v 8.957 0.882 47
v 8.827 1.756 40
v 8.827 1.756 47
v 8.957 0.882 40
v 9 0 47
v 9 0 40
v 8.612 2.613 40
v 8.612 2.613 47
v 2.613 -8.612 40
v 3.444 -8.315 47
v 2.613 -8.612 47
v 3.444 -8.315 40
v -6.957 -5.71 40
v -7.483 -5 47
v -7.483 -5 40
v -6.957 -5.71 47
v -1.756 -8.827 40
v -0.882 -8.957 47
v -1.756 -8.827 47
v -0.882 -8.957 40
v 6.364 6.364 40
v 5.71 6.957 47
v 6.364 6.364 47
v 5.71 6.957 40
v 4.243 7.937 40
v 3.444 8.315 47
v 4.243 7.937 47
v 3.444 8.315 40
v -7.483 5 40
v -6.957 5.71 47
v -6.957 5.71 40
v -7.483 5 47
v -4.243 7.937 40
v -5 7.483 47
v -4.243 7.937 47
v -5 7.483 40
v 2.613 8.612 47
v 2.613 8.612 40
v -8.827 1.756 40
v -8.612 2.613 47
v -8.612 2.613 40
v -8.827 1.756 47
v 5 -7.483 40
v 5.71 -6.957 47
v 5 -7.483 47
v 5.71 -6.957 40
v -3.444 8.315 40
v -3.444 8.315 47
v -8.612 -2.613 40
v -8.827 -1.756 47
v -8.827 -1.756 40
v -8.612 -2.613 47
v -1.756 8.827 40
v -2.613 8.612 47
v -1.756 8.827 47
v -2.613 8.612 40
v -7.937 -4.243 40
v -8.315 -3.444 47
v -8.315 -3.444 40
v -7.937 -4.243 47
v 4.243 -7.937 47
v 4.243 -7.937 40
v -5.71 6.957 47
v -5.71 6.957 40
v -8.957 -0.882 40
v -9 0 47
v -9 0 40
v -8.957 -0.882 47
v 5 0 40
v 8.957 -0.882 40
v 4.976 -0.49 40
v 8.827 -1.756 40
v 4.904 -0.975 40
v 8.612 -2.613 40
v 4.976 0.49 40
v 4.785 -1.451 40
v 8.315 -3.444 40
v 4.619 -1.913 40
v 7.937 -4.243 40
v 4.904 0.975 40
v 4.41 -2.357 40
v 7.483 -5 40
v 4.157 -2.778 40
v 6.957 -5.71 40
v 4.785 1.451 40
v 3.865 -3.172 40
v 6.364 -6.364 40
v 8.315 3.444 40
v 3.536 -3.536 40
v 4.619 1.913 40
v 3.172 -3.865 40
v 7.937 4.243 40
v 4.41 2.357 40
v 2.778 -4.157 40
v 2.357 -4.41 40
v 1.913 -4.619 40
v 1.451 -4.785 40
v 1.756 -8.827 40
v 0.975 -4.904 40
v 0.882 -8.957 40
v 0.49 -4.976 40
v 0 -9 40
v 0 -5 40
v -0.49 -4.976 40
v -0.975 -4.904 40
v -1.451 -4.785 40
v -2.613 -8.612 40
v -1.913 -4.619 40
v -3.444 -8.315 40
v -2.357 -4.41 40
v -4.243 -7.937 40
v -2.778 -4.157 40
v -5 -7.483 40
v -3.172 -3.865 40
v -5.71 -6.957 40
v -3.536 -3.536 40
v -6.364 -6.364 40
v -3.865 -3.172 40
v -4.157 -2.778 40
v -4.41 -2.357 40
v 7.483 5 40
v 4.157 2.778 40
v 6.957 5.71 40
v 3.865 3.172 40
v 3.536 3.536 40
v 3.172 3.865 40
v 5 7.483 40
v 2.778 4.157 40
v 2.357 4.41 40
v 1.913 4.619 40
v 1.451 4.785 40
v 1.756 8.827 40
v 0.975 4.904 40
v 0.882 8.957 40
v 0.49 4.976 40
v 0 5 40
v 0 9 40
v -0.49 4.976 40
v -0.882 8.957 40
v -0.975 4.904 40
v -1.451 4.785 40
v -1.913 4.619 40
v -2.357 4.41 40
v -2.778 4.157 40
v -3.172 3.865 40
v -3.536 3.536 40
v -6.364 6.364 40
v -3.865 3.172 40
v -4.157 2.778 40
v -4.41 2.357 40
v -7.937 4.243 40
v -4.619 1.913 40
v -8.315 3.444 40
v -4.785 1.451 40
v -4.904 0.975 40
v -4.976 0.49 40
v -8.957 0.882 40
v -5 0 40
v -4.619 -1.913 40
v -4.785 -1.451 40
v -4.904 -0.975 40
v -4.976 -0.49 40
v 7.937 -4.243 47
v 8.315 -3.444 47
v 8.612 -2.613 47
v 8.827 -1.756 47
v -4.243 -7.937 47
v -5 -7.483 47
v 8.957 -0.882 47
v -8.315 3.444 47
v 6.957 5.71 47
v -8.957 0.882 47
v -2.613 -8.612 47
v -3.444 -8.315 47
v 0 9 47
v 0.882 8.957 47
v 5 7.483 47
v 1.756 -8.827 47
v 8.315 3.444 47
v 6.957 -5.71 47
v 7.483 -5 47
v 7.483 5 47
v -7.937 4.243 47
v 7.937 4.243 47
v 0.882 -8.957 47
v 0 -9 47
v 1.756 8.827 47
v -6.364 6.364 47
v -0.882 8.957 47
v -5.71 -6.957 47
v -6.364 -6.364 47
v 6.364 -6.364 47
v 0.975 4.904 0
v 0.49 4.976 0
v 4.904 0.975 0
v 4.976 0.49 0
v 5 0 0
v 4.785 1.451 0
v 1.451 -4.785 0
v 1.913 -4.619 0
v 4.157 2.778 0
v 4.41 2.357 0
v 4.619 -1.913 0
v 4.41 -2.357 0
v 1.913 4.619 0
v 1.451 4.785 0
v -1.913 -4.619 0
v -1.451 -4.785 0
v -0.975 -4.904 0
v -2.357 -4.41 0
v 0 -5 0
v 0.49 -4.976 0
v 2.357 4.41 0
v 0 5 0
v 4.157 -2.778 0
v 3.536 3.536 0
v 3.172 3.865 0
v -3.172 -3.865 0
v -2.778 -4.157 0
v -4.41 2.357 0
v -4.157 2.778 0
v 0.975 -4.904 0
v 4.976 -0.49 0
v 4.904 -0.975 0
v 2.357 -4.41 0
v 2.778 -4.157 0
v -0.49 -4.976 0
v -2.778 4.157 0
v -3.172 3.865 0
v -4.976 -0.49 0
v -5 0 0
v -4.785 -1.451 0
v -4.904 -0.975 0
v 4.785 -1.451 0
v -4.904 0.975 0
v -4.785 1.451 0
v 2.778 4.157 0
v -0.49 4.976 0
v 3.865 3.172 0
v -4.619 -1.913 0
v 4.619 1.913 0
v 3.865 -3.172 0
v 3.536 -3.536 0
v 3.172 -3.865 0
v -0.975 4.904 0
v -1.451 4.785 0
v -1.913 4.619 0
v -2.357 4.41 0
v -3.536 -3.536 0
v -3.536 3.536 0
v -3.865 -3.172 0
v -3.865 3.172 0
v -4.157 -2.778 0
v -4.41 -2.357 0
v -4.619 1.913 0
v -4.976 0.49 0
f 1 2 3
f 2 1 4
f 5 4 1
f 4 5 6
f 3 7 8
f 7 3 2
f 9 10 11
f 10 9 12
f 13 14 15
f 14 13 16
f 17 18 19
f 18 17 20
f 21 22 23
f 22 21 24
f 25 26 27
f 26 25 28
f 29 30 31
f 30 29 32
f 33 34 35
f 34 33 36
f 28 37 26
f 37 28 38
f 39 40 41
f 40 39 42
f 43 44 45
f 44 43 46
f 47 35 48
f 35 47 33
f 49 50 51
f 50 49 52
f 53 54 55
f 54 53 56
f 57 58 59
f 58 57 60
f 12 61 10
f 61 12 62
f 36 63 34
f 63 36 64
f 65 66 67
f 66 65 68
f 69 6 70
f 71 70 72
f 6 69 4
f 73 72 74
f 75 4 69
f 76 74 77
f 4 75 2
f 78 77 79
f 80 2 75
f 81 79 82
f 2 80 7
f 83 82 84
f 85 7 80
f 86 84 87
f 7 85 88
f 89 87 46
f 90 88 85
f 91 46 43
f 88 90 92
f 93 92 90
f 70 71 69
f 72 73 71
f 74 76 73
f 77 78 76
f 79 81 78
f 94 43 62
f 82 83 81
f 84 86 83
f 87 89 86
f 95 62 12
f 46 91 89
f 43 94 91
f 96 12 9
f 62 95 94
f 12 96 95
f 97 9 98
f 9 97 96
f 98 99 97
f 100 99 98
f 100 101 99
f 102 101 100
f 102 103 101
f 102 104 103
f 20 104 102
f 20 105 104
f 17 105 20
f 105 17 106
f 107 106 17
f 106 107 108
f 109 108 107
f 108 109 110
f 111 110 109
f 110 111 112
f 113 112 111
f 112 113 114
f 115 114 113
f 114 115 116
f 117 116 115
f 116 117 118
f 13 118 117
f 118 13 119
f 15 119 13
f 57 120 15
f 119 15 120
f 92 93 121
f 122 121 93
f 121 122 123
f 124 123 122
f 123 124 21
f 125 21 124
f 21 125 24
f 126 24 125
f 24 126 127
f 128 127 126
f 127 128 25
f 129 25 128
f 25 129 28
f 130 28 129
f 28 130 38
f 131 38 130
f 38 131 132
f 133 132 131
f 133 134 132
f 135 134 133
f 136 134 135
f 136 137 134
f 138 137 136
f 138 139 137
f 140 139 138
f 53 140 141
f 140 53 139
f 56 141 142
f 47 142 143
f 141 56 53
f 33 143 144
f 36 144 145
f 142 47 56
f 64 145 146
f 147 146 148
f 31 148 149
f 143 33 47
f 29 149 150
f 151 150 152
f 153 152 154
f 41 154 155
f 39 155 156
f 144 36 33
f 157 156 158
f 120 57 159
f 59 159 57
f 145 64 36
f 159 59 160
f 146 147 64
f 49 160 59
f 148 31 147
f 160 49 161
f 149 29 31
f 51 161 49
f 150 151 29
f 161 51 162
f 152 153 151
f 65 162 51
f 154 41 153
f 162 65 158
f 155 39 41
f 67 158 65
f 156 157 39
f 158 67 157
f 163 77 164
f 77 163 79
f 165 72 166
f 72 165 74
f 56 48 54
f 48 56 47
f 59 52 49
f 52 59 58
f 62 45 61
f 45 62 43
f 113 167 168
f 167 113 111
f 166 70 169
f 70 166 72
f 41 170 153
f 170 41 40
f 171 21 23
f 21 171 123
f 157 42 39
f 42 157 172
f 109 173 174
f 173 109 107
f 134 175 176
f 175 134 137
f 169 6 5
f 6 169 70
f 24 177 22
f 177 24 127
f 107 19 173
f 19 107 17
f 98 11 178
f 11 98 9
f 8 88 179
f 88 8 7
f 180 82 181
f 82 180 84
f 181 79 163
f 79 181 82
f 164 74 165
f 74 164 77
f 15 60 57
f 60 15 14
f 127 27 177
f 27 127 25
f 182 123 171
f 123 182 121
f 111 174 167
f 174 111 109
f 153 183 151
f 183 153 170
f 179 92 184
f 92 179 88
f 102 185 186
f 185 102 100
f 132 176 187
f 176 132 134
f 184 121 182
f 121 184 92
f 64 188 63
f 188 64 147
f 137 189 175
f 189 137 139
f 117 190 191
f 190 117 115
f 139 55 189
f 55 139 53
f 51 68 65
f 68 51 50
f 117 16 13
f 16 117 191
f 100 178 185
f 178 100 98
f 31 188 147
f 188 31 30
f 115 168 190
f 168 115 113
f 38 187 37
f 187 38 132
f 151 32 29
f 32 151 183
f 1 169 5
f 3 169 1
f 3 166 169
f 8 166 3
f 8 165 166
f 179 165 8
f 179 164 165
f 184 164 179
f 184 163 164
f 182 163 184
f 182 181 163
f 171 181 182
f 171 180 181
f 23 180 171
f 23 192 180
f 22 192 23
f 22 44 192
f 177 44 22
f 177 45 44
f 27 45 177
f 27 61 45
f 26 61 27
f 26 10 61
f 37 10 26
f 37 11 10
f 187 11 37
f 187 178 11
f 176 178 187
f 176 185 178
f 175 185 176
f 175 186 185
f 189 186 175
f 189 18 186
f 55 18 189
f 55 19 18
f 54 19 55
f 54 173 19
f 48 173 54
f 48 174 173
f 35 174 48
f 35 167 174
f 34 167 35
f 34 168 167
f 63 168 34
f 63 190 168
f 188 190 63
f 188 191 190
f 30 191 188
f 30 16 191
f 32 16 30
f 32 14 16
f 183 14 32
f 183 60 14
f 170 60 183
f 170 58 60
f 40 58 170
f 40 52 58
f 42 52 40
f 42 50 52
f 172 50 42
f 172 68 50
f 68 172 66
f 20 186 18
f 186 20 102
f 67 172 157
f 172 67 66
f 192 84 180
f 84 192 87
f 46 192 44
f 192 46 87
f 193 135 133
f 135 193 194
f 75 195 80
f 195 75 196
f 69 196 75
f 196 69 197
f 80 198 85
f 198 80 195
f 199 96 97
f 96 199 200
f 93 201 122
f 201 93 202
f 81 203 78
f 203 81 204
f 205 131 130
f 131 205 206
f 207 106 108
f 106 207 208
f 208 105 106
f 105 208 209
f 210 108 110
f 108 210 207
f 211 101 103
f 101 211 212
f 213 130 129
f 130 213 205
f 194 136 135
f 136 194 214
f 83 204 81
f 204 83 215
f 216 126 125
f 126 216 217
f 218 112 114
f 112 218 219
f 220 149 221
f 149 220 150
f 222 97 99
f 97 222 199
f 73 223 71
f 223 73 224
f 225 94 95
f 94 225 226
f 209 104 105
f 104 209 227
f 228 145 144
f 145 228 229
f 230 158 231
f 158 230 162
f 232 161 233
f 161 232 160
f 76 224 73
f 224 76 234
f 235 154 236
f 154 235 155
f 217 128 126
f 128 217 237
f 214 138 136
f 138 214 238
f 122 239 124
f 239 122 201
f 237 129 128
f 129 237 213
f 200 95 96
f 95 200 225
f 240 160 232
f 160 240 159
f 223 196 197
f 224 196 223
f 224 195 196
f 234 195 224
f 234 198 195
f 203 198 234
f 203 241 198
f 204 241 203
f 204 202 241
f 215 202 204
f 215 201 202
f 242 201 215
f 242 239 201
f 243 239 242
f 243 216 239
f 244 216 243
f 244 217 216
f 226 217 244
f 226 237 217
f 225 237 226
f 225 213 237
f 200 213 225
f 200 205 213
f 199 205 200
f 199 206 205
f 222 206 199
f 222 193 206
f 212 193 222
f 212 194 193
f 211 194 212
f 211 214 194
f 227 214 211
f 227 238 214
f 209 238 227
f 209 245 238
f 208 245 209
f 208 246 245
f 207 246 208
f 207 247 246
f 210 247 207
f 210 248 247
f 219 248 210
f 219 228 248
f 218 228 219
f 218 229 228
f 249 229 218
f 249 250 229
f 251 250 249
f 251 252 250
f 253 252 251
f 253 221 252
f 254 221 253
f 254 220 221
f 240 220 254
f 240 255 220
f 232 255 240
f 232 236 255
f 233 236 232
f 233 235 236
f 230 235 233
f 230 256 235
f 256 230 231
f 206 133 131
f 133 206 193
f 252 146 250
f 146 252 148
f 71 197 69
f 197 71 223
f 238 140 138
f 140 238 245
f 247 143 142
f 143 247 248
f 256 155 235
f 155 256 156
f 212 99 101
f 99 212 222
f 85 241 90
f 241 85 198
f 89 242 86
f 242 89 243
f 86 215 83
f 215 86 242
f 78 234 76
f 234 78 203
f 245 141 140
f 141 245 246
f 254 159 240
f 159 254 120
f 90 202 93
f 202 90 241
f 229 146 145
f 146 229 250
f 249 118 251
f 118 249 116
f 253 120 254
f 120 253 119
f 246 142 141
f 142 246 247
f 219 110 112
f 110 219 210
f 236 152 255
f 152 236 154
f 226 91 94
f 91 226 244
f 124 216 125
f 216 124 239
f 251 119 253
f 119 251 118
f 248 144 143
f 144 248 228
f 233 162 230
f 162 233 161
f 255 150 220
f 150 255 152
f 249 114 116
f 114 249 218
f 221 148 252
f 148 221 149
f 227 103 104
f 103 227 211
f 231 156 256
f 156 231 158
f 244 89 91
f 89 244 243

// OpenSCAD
// Generated by Text-to-CAD from prompt:
// an M10 bolt 40 mm long
$fn = 64;

module Bolt() {
    translate([0, 0, 40]) {
    cylinder(h=7, r=9, $fn=$fn);
    }
cylinder(h=40, r=5, $fn=$fn);
}

Bolt();
